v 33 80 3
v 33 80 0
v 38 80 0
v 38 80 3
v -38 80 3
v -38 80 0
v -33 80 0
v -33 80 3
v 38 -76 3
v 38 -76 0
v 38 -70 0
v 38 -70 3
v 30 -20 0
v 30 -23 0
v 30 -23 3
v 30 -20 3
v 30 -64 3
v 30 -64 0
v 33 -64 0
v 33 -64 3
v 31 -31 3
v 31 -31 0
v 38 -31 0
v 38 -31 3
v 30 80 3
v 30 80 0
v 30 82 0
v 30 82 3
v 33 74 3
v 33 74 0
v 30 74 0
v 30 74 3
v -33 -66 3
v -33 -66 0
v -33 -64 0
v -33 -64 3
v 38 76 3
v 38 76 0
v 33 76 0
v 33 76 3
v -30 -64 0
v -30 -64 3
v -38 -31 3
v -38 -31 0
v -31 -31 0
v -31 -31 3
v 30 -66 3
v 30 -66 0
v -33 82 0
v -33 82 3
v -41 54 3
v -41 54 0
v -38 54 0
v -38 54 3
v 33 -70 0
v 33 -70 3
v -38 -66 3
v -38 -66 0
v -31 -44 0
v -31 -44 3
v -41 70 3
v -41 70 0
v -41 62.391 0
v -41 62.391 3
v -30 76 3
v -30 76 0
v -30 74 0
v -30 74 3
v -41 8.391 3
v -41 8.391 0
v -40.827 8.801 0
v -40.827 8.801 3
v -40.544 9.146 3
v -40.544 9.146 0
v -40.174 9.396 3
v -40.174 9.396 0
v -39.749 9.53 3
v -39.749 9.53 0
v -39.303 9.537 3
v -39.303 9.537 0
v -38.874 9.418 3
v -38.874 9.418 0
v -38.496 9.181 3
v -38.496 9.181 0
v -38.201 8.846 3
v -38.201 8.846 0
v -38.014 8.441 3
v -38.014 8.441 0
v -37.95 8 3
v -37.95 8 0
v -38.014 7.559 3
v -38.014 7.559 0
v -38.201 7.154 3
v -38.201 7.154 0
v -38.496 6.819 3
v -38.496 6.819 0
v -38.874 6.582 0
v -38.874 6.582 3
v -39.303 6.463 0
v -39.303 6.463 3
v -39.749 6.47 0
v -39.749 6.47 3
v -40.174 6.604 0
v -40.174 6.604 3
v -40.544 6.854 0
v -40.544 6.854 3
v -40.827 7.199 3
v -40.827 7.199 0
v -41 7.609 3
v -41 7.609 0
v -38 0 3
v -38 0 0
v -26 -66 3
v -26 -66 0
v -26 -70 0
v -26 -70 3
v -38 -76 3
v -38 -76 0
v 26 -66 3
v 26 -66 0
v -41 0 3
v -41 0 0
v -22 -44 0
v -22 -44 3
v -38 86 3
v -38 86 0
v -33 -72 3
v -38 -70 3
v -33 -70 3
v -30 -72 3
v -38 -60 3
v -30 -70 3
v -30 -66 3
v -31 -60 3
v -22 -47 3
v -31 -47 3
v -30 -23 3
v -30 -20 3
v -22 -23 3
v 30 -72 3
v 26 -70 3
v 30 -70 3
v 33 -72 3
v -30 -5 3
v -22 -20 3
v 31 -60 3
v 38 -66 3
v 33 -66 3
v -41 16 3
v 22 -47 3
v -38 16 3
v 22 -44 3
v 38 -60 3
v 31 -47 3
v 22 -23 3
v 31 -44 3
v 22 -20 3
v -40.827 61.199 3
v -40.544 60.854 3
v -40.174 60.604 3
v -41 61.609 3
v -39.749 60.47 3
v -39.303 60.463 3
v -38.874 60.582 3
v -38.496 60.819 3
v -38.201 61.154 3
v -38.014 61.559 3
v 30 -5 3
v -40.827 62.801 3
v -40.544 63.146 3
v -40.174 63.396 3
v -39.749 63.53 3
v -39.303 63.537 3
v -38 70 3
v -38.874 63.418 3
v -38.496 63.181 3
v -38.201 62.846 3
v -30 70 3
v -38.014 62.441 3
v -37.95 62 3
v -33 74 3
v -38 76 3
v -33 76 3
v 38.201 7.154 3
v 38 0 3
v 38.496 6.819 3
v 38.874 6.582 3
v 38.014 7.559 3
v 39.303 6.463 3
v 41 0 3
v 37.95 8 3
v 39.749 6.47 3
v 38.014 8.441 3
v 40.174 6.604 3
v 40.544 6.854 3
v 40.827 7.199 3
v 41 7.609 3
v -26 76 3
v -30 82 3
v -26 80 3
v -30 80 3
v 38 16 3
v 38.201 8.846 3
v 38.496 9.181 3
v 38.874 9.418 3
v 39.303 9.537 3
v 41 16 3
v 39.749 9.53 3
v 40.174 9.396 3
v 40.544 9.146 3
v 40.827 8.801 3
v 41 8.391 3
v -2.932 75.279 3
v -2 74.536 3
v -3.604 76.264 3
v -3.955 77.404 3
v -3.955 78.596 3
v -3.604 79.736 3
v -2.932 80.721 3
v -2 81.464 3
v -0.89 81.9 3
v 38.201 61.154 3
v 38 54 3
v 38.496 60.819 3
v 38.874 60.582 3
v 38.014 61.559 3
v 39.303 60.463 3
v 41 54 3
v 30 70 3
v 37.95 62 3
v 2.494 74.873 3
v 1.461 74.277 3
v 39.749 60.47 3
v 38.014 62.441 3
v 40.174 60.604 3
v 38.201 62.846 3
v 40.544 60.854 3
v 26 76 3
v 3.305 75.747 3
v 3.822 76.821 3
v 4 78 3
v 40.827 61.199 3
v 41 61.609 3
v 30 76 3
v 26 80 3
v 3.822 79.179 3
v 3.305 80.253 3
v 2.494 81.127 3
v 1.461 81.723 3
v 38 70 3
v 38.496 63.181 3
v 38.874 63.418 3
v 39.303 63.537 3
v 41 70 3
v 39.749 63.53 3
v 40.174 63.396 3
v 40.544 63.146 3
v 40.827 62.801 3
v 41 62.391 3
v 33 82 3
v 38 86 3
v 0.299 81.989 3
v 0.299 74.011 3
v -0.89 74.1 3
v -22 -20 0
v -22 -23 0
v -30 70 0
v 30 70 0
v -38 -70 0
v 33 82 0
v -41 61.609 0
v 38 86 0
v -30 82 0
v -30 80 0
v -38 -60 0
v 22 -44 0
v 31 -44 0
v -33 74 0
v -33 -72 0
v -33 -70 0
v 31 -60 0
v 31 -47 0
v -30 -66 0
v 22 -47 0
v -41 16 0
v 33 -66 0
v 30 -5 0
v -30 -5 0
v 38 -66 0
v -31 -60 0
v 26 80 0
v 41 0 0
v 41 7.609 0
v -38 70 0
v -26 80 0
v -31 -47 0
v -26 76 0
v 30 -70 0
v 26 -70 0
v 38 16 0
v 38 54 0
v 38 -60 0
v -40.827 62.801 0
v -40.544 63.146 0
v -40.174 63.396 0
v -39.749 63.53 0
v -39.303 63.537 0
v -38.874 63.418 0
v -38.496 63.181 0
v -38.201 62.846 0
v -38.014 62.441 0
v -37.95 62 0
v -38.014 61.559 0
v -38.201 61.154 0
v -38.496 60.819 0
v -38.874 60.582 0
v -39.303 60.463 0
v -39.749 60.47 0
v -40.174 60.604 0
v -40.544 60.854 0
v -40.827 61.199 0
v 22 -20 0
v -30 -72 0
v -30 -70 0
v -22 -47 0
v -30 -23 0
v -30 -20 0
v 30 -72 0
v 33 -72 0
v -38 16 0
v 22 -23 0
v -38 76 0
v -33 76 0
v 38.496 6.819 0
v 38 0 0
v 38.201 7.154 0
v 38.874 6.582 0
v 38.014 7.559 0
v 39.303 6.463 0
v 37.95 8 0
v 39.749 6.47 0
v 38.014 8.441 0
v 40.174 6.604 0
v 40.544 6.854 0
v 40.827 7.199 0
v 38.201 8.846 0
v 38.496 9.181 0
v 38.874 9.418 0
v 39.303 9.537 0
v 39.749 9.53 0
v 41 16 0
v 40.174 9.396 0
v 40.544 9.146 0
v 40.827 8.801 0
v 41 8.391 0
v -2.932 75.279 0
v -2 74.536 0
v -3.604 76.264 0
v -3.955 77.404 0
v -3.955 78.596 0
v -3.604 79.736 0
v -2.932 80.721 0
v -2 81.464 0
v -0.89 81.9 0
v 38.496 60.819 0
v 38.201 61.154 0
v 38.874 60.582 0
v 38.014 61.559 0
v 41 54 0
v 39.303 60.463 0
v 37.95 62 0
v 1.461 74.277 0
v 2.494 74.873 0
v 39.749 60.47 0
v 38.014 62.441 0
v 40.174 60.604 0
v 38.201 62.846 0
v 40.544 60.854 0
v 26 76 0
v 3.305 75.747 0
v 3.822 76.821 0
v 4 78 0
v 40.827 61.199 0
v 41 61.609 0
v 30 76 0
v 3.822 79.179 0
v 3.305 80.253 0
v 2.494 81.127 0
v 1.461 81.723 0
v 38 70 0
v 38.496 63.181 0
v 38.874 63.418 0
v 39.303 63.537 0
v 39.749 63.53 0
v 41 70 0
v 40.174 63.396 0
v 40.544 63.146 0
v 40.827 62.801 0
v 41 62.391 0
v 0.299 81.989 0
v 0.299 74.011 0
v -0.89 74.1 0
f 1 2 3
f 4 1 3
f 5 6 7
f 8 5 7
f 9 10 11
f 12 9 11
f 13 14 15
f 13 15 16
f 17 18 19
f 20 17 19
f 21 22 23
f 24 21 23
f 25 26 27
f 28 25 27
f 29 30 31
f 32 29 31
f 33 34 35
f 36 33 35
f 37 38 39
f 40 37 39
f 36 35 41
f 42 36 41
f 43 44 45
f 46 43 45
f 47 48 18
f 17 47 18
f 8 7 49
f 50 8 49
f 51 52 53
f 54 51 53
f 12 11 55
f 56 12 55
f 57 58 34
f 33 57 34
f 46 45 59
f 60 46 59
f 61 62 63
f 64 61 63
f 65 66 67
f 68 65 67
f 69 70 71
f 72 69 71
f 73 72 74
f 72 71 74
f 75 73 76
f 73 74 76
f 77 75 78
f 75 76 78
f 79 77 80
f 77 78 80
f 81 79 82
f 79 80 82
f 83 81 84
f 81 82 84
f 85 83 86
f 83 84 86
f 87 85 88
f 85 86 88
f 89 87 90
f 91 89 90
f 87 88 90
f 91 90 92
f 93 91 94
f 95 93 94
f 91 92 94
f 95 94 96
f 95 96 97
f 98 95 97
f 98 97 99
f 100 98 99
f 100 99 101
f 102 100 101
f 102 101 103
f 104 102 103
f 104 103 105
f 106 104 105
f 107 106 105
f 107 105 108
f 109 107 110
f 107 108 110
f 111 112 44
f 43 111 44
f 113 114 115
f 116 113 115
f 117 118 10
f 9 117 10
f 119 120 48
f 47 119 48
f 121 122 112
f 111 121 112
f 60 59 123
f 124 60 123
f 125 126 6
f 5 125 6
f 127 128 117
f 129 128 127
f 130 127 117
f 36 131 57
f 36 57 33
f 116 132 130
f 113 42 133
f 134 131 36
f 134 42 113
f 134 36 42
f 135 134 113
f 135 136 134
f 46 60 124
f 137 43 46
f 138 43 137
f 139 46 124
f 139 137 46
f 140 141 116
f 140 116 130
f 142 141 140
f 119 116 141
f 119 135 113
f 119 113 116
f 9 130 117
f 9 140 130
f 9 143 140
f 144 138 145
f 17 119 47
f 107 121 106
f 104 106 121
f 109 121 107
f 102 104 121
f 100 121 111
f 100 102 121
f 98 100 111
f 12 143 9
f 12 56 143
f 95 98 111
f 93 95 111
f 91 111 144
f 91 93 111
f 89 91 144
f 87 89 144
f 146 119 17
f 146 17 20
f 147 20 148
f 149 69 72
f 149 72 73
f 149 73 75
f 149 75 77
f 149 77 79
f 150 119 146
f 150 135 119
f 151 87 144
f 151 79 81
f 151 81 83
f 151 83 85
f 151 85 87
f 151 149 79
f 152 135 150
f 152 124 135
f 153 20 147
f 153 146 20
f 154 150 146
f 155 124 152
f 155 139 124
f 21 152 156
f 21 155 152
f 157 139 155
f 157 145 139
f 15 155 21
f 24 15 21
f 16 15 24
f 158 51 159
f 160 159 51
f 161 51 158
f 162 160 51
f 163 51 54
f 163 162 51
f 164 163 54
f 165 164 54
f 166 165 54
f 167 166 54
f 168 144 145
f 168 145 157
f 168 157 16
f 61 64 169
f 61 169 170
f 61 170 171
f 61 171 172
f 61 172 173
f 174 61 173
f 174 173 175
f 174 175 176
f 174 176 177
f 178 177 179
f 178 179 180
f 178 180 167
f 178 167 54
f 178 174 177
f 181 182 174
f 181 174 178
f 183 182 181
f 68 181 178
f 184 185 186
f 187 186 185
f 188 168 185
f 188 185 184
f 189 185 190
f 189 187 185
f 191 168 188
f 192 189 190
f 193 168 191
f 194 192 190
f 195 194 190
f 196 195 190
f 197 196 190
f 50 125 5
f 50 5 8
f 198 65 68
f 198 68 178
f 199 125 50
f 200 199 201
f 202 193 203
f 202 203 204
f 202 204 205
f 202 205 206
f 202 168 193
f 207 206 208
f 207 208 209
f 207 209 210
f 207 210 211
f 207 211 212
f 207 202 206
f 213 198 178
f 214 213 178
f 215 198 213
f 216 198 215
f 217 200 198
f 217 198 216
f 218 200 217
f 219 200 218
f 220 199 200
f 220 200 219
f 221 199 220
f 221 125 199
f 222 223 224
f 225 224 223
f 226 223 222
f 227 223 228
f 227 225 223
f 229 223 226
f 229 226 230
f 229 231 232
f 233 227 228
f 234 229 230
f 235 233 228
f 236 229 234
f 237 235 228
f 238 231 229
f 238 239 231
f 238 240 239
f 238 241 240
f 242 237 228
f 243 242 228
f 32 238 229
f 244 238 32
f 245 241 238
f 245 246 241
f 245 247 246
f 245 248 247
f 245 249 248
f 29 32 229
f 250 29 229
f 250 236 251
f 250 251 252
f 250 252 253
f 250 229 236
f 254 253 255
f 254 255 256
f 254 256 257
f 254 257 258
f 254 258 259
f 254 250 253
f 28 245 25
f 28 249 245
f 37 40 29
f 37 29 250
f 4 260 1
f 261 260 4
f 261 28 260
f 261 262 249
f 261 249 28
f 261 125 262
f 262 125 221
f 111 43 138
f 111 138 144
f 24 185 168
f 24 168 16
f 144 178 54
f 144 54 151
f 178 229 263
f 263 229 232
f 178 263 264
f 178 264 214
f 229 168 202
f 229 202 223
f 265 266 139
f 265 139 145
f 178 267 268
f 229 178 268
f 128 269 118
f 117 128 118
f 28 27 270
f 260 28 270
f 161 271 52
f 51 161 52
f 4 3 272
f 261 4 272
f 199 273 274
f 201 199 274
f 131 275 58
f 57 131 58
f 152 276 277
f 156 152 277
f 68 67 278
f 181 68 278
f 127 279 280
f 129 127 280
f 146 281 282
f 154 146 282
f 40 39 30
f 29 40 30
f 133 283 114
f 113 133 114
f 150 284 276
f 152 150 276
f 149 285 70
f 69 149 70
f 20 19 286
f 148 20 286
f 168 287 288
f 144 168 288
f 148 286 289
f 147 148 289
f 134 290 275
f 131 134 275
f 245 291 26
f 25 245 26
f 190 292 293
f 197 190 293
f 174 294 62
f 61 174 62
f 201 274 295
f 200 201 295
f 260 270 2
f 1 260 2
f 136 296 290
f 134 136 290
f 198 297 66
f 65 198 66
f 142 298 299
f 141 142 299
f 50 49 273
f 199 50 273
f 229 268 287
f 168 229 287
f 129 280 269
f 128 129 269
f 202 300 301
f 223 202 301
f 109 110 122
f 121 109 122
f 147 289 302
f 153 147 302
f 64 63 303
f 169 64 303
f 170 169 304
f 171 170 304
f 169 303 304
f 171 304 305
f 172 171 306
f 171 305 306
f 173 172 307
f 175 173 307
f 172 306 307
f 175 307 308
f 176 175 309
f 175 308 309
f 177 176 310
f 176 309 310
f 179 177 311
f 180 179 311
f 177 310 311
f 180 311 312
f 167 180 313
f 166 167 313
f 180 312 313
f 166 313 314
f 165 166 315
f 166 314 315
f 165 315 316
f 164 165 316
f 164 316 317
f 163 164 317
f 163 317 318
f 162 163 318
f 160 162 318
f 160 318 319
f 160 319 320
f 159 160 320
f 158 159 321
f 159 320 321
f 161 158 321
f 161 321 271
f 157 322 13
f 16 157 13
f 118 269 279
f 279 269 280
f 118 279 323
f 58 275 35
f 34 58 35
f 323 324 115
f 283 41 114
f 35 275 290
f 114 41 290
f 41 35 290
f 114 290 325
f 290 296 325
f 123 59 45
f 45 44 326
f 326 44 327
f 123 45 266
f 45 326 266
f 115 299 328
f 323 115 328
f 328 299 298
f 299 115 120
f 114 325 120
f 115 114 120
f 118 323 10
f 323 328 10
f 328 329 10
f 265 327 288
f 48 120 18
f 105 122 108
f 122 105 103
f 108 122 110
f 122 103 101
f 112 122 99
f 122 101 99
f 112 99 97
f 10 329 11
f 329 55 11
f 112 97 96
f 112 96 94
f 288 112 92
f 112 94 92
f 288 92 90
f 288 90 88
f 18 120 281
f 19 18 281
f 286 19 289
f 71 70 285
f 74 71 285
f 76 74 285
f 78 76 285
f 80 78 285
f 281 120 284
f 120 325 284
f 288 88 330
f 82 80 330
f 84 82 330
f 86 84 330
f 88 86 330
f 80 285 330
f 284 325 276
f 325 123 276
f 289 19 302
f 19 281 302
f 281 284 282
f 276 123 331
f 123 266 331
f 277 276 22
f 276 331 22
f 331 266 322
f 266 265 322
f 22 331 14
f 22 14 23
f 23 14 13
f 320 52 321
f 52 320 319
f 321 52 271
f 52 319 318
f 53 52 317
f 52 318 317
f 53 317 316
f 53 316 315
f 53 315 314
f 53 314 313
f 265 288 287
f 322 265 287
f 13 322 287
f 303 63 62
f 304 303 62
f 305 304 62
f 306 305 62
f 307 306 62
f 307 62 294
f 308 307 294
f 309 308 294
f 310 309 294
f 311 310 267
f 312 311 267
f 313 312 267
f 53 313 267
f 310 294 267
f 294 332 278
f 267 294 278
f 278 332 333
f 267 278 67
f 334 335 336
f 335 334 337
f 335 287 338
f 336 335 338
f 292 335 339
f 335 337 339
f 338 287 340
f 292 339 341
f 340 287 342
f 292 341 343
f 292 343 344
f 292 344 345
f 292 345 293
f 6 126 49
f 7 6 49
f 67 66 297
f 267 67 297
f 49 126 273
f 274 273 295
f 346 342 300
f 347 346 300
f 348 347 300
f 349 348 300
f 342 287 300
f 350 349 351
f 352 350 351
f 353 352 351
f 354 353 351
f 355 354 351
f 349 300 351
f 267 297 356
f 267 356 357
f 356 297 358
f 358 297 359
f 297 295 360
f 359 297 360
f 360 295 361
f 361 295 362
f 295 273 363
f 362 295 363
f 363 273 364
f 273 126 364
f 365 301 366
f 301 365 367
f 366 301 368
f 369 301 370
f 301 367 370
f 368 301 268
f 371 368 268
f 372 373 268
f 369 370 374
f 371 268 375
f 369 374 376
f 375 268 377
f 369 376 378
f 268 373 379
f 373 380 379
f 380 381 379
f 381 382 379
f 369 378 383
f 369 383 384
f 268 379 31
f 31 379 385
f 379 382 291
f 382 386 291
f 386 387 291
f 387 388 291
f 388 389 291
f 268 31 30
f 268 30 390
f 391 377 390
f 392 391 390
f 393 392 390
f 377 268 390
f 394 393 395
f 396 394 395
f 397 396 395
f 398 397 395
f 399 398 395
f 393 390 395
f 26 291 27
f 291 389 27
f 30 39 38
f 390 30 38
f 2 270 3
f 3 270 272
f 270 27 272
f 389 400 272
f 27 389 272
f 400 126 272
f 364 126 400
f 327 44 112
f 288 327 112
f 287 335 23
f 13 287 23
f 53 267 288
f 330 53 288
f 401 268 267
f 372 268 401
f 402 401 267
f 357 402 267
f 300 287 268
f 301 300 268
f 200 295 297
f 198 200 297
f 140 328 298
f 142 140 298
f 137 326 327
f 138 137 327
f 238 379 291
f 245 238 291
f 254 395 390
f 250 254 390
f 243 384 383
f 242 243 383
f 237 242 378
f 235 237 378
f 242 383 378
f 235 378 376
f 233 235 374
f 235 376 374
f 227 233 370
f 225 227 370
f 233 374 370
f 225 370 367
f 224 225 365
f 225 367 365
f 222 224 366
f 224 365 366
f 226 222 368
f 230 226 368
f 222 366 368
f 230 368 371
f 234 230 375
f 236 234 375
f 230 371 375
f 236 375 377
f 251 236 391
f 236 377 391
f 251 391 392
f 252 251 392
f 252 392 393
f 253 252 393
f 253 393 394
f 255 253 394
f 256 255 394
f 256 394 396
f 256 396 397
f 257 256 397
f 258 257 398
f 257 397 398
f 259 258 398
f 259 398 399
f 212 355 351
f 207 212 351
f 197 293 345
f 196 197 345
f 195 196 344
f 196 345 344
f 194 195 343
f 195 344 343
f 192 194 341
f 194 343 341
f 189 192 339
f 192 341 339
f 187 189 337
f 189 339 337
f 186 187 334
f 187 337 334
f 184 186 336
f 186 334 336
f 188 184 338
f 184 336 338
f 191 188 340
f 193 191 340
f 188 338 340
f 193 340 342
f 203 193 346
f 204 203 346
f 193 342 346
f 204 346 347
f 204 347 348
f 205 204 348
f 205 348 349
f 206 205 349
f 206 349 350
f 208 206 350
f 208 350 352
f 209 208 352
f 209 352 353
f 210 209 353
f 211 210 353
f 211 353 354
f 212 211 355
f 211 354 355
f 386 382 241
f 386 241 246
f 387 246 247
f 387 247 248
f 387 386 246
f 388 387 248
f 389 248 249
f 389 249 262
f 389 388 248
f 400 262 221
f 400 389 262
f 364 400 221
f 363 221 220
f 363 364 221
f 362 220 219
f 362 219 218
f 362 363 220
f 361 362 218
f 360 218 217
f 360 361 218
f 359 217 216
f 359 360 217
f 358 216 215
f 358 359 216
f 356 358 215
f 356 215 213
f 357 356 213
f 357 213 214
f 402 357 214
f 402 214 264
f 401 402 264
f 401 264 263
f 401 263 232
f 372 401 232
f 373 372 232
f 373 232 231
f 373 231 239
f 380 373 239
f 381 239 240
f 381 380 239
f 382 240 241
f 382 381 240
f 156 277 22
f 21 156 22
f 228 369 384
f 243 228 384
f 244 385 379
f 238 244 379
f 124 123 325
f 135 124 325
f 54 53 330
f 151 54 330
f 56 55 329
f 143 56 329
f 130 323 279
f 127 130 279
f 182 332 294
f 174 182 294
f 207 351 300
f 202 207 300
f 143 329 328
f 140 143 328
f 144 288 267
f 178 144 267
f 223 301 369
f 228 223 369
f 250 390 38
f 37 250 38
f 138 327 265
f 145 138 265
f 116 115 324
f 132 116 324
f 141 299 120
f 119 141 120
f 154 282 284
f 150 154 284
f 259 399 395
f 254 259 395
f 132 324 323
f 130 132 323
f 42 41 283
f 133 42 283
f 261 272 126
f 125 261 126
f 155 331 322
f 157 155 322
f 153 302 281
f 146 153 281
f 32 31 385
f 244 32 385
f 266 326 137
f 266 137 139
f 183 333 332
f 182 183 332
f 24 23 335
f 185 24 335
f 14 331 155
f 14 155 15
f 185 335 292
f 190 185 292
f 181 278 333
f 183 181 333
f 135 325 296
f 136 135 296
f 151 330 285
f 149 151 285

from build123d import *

# Parameters (mm, degrees)
SKETCH_1_W      = 8
SKETCH_1_H      = 3
SKETCH_1_R      = 4
EXTRUDE_1_DEPTH = 3


with BuildPart() as part:
    # 草图1 → 凸台-拉伸1 (new body)
    with BuildSketch(Plane.XY):
        with BuildLine():
            Line((38, 80), (38, 86))
            Line((38, 86), (-38, 86))
            Line((-38, 86), (-38, 80))
            Line((-38, 80), (-33, 80))
            Line((-33, 80), (-33, 82))
            Line((-33, 82), (-30, 82))
            Line((-30, 82), (-30, 80))
            Line((-30, 80), (-26, 80))
            Line((-26, 80), (-26, 76))
            Line((-26, 76), (-30, 76))
            Line((-30, 76), (-30, 74))
            Line((-30, 74), (-33, 74))
            Line((-33, 74), (-33, 76))
            Line((-33, 76), (-38, 76))
            Line((-38, 76), (-38, 70))
            Line((-38, 70), (-41, 70))
            Line((-41, 70), (-41, 62.390512484))
            ThreePointArc((-41, 62.390512484), (-37.95, 62), (-41, 61.609487516))
            Line((-41, 61.609487516), (-41, 54))
            Line((-41, 54), (-38, 54))
            Line((-38, 54), (-38, 16))
            Line((-38, 16), (-41, 16))
            Line((-41, 16), (-41, 8.390512484))
            ThreePointArc((-41, 8.390512484), (-37.95, 8), (-41, 7.609487516))
            Line((-41, 7.609487516), (-41, 0))
            Line((-41, 0), (-38, 0))
            Line((-38, 0), (-38, -31))
            Line((-38, -31), (-31, -31))
            Line((-31, -31), (-31, -44))
            Line((-31, -44), (-22, -44))
            Line((-22, -44), (-22, -47))
            Line((-22, -47), (-31, -47))
            Line((-31, -47), (-31, -60))
            Line((-31, -60), (-38, -60))
            Line((-38, -60), (-38, -66))
            Line((-38, -66), (-33, -66))
            Line((-33, -66), (-33, -64))
            Line((-33, -64), (-30, -64))
            Line((-30, -64), (-30, -66))
            Line((-30, -66), (-26, -66))
            Line((-26, -66), (-26, -70))
            Line((-26, -70), (-30, -70))
            Line((-30, -70), (-30, -72))
            Line((-30, -72), (-33, -72))
            Line((-33, -72), (-33, -70))
            Line((-33, -70), (-38, -70))
            Line((-38, -70), (-38, -76))
            Line((-38, -76), (38, -76))
            Line((38, -76), (38, -70))
            Line((38, -70), (33, -70))
            Line((33, -70), (33, -72))
            Line((33, -72), (30, -72))
            Line((30, -72), (30, -70))
            Line((30, -70), (26, -70))
            Line((26, -70), (26, -66))
            Line((26, -66), (30, -66))
            Line((30, -66), (30, -64))
            Line((30, -64), (33, -64))
            Line((33, -64), (33, -66))
            Line((33, -66), (38, -66))
            Line((38, -66), (38, -60))
            Line((38, -60), (31, -60))
            Line((31, -60), (31, -47))
            Line((31, -47), (22, -47))
            Line((22, -47), (22, -44))
            Line((22, -44), (31, -44))
            Line((31, -44), (31, -31))
            Line((31, -31), (38, -31))
            Line((38, -31), (38, 0))
            Line((38, 0), (41, 0))
            Line((41, 0), (41, 7.609487516))
            ThreePointArc((41, 7.609487516), (37.95, 8), (41, 8.390512484))
            Line((41, 8.390512484), (41, 16))
            Line((41, 16), (38, 16))
            Line((38, 16), (38, 54))
            Line((38, 54), (41, 54))
            Line((41, 54), (41, 61.609487516))
            ThreePointArc((41, 61.609487516), (37.95, 62), (41, 62.390512484))
            Line((41, 62.390512484), (41, 70))
            Line((41, 70), (38, 70))
            Line((38, 70), (38, 76))
            Line((38, 76), (33, 76))
            Line((33, 76), (33, 74))
            Line((33, 74), (30, 74))
            Line((30, 74), (30, 76))
            Line((30, 76), (26, 76))
            Line((26, 76), (26, 80))
            Line((26, 80), (30, 80))
            Line((30, 80), (30, 82))
            Line((30, 82), (33, 82))
            Line((33, 82), (33, 80))
            Line((33, 80), (38, 80))
        make_face()
        with Locations((-26, -21.5)):
            Rectangle(SKETCH_1_W, SKETCH_1_H, mode=Mode.SUBTRACT)
        with Locations((26, -21.5)):
            Rectangle(SKETCH_1_W, SKETCH_1_H, mode=Mode.SUBTRACT)
        Polygon((-30, -5), (-30, 0), (-30, 70), (30, 70), (30, 0), (30, -5), align=None, mode=Mode.SUBTRACT)
        with Locations((0, 78)):
            Circle(SKETCH_1_R, mode=Mode.SUBTRACT)
    extrude(amount=EXTRUDE_1_DEPTH)


solid = part.part
